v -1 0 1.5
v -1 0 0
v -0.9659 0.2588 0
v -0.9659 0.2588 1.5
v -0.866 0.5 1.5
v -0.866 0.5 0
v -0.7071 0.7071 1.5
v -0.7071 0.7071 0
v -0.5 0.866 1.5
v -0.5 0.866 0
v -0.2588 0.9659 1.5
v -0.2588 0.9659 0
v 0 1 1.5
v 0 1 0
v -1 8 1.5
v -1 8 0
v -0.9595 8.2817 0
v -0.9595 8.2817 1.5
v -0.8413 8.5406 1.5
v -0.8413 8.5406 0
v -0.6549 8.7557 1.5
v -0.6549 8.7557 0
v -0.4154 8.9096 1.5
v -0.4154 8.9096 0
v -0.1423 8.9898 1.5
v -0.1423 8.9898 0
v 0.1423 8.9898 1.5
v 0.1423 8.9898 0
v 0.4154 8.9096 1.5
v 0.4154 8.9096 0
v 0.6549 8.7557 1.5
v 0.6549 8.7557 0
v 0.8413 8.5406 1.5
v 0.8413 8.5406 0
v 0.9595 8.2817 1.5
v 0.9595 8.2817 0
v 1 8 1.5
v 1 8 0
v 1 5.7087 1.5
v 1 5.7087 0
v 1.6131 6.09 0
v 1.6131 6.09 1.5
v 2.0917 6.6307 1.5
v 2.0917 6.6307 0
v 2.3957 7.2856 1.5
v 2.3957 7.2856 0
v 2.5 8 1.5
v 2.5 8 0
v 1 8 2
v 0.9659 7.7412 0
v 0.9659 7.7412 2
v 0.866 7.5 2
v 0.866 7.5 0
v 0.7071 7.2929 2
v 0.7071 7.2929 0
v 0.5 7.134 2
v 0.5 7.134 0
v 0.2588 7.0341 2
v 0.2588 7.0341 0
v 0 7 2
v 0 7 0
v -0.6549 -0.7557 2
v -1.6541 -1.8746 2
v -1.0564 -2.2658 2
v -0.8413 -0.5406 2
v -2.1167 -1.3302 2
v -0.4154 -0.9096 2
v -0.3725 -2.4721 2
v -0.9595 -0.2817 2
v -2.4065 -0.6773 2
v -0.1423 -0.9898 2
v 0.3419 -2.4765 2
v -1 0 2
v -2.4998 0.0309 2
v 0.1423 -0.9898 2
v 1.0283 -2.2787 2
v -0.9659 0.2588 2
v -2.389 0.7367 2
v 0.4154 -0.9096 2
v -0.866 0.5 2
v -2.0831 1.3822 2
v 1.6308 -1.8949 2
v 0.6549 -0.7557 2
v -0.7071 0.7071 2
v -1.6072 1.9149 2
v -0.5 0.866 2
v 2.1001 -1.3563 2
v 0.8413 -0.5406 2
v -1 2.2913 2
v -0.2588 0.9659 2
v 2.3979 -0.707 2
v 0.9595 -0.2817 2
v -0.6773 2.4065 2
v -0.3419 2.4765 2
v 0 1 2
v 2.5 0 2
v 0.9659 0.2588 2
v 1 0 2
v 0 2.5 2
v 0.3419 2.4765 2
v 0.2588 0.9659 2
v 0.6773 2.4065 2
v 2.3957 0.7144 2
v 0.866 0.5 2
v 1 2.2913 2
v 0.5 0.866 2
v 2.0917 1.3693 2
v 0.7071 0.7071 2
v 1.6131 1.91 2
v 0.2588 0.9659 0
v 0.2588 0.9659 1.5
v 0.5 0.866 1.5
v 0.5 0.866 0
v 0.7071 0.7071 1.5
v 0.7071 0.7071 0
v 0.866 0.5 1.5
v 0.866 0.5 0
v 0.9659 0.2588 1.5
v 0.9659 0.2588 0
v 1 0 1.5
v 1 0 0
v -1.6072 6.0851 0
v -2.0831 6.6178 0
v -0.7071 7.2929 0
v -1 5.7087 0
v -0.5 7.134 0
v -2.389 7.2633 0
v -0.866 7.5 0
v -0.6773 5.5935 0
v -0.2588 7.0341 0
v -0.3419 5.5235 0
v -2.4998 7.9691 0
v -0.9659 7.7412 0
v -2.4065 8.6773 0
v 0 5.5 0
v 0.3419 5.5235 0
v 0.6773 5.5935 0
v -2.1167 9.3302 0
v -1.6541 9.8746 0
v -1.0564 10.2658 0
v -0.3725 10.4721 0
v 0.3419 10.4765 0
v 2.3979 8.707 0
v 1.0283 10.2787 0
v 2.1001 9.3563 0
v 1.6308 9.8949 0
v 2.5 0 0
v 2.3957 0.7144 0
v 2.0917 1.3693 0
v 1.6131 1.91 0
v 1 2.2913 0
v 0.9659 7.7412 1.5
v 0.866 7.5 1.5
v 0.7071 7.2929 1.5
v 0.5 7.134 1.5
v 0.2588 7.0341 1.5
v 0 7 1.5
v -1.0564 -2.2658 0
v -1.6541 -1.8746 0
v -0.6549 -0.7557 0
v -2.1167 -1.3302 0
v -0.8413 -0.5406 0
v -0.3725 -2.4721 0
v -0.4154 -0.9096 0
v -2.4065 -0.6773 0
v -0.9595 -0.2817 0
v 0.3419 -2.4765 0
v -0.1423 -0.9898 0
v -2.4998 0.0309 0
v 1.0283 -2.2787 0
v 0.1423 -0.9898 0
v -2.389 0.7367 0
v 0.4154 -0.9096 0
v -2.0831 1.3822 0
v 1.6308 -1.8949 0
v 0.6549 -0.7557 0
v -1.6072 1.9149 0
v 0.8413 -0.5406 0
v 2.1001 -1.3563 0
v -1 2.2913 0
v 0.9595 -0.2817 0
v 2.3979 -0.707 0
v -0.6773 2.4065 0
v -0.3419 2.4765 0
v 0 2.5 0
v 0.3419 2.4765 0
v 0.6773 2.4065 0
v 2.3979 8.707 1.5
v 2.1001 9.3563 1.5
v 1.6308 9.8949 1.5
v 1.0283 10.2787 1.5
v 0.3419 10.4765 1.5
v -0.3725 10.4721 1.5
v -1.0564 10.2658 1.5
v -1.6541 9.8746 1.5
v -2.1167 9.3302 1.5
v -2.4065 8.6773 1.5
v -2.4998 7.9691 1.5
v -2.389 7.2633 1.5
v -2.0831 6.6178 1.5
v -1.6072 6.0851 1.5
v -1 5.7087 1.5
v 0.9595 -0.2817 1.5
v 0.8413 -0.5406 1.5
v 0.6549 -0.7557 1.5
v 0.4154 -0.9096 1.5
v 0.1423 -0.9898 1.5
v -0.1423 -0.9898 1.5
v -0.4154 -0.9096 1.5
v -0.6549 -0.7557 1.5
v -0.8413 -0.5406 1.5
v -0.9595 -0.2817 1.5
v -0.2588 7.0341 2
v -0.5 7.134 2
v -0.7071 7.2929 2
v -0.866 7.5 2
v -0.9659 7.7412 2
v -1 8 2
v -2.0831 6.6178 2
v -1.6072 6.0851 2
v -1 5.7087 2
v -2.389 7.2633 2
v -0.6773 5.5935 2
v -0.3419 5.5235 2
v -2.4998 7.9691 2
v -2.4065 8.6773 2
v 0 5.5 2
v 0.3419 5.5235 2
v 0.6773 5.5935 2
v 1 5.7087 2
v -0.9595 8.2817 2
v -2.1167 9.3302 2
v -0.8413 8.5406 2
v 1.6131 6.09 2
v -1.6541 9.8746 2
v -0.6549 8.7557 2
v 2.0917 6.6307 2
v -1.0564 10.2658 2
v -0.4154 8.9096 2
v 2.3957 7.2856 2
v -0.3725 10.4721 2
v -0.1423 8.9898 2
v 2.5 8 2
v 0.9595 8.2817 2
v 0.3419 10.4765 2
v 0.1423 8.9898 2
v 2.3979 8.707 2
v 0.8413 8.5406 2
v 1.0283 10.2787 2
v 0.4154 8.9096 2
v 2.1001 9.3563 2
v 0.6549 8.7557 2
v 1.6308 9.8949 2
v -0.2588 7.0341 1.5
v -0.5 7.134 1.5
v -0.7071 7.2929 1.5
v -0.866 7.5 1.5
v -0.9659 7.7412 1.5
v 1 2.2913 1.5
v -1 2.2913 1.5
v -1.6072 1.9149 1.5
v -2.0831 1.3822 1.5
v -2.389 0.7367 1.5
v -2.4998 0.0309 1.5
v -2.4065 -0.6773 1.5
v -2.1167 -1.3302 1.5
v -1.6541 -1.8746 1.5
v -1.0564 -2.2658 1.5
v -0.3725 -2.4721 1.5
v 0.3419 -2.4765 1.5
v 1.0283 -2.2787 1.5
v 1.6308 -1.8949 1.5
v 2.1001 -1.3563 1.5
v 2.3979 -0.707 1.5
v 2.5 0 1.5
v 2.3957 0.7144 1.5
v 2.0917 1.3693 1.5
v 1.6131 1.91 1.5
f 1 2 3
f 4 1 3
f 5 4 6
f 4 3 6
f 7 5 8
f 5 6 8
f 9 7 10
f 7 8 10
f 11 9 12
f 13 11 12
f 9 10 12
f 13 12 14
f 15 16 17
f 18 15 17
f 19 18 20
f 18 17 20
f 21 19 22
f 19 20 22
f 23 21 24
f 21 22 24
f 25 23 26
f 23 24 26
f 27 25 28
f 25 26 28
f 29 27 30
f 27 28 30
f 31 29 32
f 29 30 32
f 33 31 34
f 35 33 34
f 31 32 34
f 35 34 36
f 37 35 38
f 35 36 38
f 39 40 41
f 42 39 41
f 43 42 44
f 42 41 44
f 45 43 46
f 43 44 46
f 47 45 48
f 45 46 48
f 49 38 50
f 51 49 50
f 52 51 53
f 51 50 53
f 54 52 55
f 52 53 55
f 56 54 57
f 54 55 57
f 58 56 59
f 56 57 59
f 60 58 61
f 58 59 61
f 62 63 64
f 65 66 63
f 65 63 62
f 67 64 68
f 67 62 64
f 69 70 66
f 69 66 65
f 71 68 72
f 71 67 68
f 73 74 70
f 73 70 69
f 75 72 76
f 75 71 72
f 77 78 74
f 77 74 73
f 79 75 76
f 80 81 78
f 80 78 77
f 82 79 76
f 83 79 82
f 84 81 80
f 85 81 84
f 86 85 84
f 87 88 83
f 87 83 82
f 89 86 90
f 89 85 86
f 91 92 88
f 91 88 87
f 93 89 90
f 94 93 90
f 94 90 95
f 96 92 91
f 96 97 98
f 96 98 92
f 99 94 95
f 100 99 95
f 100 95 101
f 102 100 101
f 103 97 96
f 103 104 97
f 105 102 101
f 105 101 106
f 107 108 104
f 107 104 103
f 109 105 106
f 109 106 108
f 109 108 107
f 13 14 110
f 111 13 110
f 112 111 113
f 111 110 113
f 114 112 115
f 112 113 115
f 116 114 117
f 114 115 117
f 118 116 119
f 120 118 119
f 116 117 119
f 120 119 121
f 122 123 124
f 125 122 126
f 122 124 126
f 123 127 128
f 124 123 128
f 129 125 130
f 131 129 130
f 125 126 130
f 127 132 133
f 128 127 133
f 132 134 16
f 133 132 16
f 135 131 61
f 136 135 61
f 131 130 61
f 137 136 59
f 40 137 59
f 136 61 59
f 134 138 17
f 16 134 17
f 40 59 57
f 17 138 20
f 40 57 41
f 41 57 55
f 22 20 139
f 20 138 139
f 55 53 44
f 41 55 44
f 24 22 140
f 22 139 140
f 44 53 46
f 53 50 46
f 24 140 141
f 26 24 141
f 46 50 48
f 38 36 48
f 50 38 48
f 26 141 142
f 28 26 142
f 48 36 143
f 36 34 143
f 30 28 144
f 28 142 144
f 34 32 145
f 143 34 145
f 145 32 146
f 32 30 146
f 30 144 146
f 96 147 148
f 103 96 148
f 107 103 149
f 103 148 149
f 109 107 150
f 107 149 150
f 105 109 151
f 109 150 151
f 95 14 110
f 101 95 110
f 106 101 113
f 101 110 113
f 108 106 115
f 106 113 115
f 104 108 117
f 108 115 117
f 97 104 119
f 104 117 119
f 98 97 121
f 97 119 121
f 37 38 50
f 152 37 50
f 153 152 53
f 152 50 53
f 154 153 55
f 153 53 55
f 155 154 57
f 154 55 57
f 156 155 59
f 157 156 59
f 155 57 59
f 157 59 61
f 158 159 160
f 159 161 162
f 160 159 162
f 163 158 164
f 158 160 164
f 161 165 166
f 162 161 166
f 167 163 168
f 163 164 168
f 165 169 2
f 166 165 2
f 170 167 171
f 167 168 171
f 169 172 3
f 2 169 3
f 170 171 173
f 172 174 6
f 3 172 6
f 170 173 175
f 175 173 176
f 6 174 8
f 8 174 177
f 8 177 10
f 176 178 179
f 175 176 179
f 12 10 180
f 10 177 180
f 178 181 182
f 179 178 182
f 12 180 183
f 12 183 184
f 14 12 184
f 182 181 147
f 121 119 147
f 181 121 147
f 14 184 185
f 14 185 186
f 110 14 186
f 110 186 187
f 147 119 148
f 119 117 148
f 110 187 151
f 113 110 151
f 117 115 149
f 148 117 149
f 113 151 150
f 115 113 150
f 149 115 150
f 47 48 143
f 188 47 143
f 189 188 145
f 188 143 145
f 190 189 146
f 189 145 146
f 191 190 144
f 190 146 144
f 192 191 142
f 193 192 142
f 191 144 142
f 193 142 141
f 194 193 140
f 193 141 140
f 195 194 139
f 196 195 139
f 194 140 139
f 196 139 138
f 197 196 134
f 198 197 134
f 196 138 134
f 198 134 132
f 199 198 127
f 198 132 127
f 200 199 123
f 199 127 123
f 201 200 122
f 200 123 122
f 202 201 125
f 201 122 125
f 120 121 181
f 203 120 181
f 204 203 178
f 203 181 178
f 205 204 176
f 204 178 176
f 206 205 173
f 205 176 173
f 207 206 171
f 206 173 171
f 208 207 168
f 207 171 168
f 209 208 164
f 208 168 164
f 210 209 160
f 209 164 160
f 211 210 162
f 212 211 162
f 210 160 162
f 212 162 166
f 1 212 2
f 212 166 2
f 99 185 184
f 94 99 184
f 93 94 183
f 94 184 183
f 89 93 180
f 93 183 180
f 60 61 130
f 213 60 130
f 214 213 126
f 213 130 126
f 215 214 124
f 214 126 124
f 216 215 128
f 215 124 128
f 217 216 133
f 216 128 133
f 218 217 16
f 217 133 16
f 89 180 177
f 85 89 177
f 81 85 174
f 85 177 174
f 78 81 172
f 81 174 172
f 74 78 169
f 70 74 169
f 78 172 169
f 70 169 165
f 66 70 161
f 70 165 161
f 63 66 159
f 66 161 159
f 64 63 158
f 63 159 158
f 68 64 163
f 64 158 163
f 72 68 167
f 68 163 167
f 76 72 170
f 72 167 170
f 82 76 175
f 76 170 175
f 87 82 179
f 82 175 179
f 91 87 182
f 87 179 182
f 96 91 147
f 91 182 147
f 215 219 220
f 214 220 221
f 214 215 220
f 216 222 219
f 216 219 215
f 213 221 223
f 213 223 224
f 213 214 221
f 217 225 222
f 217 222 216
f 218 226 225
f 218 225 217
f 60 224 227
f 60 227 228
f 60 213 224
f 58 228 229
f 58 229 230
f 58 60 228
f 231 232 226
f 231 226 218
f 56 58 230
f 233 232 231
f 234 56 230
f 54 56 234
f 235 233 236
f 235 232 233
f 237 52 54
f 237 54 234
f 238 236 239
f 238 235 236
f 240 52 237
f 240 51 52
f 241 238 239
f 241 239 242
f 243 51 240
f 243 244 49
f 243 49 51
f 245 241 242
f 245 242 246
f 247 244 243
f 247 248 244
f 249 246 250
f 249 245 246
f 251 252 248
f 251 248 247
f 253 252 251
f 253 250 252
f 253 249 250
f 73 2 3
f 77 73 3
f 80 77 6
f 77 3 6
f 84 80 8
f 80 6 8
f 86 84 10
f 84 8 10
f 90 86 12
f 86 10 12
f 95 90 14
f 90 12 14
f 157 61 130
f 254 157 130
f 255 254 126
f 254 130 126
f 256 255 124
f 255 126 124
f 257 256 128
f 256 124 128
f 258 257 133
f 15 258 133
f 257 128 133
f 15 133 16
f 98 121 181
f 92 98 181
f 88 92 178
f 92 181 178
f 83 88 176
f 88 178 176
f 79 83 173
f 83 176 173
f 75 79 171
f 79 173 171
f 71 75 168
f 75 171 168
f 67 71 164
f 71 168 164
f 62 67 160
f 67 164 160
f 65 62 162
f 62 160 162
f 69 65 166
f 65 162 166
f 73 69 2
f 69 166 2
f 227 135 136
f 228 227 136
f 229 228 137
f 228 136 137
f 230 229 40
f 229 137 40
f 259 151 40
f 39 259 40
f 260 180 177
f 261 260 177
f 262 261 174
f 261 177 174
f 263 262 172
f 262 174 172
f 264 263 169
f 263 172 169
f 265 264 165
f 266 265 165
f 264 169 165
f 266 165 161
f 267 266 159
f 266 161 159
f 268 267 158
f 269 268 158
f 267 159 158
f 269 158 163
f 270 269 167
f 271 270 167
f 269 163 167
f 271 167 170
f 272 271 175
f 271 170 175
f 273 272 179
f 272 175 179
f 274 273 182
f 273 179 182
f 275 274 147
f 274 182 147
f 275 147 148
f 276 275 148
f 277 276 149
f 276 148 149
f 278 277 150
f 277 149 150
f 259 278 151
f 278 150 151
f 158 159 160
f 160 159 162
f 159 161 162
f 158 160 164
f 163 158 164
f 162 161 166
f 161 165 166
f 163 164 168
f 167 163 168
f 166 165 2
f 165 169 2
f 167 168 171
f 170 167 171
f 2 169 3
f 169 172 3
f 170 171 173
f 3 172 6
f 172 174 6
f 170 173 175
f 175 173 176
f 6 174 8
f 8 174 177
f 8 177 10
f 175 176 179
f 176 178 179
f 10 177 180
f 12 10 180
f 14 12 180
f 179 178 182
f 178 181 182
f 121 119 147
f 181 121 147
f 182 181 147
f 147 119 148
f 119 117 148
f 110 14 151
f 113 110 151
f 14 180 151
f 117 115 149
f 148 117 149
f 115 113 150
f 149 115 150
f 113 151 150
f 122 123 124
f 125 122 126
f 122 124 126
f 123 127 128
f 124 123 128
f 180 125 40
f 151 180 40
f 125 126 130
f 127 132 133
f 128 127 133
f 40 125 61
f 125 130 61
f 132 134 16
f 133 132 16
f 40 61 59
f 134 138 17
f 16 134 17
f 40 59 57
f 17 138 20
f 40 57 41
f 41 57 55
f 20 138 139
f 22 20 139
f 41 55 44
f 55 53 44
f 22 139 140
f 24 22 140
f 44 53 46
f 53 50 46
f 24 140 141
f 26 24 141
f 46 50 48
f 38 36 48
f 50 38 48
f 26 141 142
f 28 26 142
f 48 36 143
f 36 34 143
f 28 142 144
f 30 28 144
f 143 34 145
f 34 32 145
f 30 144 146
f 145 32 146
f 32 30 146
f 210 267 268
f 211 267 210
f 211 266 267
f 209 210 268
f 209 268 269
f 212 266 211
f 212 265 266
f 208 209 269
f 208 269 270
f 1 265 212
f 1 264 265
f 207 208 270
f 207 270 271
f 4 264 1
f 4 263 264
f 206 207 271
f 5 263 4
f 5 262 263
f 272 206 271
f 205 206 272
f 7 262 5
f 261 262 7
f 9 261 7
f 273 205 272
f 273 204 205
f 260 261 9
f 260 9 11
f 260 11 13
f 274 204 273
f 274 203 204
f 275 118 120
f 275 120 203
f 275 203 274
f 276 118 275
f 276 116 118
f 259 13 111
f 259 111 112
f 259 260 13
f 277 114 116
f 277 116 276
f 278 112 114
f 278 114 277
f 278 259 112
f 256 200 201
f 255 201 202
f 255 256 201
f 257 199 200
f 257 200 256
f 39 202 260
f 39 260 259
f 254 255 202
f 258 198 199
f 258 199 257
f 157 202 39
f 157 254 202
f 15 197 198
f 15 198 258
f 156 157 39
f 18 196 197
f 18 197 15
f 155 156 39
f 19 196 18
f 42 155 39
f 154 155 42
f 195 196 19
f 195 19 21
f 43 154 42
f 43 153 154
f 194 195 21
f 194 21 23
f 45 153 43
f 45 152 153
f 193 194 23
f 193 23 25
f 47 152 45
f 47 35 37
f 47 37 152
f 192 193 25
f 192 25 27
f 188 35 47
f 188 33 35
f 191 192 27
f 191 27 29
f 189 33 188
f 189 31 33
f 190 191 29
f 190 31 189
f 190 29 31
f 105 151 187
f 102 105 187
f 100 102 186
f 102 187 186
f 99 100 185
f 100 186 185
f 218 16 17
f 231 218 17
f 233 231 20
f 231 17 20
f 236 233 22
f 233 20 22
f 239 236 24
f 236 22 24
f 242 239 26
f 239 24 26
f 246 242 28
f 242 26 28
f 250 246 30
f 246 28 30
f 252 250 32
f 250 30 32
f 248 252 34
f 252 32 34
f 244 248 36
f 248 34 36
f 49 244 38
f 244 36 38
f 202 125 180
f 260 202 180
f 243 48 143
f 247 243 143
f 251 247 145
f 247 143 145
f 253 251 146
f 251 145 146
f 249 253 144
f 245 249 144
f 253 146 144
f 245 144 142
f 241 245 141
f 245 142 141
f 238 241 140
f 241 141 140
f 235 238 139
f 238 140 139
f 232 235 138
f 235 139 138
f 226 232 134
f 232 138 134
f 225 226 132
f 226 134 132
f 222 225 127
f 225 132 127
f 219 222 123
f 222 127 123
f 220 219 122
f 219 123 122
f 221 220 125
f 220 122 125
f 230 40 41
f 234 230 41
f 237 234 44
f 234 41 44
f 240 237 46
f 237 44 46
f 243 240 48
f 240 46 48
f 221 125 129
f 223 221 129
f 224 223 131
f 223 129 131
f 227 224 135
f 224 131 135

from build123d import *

# Parameters (mm, degrees)
F1_DEPTH = 2
F2_DEPTH = 1.5


with BuildPart() as f1:
    # F0 (on Top) → F1 (new body)
    with BuildSketch(Plane.XY):
        with BuildLine():
            ThreePointArc((2.5, 8), (-1.3693063938, 10.0916500663), (-1, 5.7087121525))
            Line((-1, 5.7087121525), (-1, 8))
            ThreePointArc((-1, 8), (0, 9), (1, 8))
            Line((1, 8), (1, 5.7087121525))
            ThreePointArc((1, 5.7087121525), (2.0916500663, 6.6306936062), (2.5, 8))
        make_face()
        with BuildLine():
            Line((-1, 8), (-1, 5.7087121525))
            ThreePointArc((-1, 5.7087121525), (-0.5107741092, 5.5527342177), (0, 5.5))
            Line((0, 5.5), (0, 7))
            ThreePointArc((0, 7), (-0.7071067812, 7.2928932188), (-1, 8))
        make_face()
        with BuildLine():
            ThreePointArc((0, 5.5), (0.5107741092, 5.5527342177), (1, 5.7087121525))
            Line((1, 5.7087121525), (1, 8))
            ThreePointArc((1, 8), (0.7071067812, 7.2928932188), (0, 7))
            Line((0, 7), (0, 5.5))
        make_face()
    extrude(amount=F1_DEPTH)


with BuildPart() as f1b:
    # F0 (on Top) → F1, piece 2 (new body)
    with BuildSketch(Plane.XY):
        with BuildLine():
            Line((-1, 2.2912878475), (-1, 0))
            ThreePointArc((-1, 0), (-0.7071067812, 0.7071067812), (0, 1))
            Line((0, 1), (0, 2.5))
            ThreePointArc((0, 2.5), (-0.5107741092, 2.4472657823), (-1, 2.2912878475))
        make_face()
        with BuildLine():
            ThreePointArc((1, 0), (0, -1), (-1, 0))
            Line((-1, 0), (-1, 2.2912878475))
            ThreePointArc((-1, 2.2912878475), (-1.3693063938, -2.0916500663), (2.5, 0))
            ThreePointArc((2.5, 0), (2.0916500663, 1.3693063938), (1, 2.2912878475))
            Line((1, 2.2912878475), (1, 0))
        make_face()
        with BuildLine():
            ThreePointArc((0, 1), (0.7071067812, 0.7071067812), (1, 0))
            Line((1, 0), (1, 2.2912878475))
            ThreePointArc((1, 2.2912878475), (0.5107741092, 2.4472657823), (0, 2.5))
            Line((0, 2.5), (0, 1))
        make_face()
    extrude(amount=F1_DEPTH)


with BuildPart() as f2:
    # F0 (on Top) → F2 (new body)
    with BuildSketch(Plane.XY):
        with BuildLine():
            ThreePointArc((0, 2.5), (0.5107741092, 2.4472657823), (1, 2.2912878475))
            Line((1, 2.2912878475), (1, 5.7087121525))
            ThreePointArc((1, 5.7087121525), (0.5107741092, 5.5527342177), (0, 5.5))
            Line((0, 5.5), (0, 2.5))
        make_face()
        with BuildLine():
            Line((-1, 5.7087121525), (-1, 2.2912878475))
            ThreePointArc((-1, 2.2912878475), (-0.5107741092, 2.4472657823), (0, 2.5))
            Line((0, 2.5), (0, 5.5))
            ThreePointArc((0, 5.5), (-0.5107741092, 5.5527342177), (-1, 5.7087121525))
        make_face()
        with BuildLine():
            Line((-1, 2.2912878475), (-1, 0))
            ThreePointArc((-1, 0), (-0.7071067812, 0.7071067812), (0, 1))
            Line((0, 1), (0, 2.5))
            ThreePointArc((0, 2.5), (-0.5107741092, 2.4472657823), (-1, 2.2912878475))
        make_face()
        with BuildLine():
            ThreePointArc((1, 0), (0, -1), (-1, 0))
            Line((-1, 0), (-1, 2.2912878475))
            ThreePointArc((-1, 2.2912878475), (-1.3693063938, -2.0916500663), (2.5, 0))
            ThreePointArc((2.5, 0), (2.0916500663, 1.3693063938), (1, 2.2912878475))
            Line((1, 2.2912878475), (1, 0))
        make_face()
        with BuildLine():
            ThreePointArc((0, 1), (0.7071067812, 0.7071067812), (1, 0))
            Line((1, 0), (1, 2.2912878475))
            ThreePointArc((1, 2.2912878475), (0.5107741092, 2.4472657823), (0, 2.5))
            Line((0, 2.5), (0, 1))
        make_face()
        with BuildLine():
            Line((-1, 8), (-1, 5.7087121525))
            ThreePointArc((-1, 5.7087121525), (-0.5107741092, 5.5527342177), (0, 5.5))
            Line((0, 5.5), (0, 7))
            ThreePointArc((0, 7), (-0.7071067812, 7.2928932188), (-1, 8))
        make_face()
        with BuildLine():
            ThreePointArc((2.5, 8), (-1.3693063938, 10.0916500663), (-1, 5.7087121525))
            Line((-1, 5.7087121525), (-1, 8))
            ThreePointArc((-1, 8), (0, 9), (1, 8))
            Line((1, 8), (1, 5.7087121525))
            ThreePointArc((1, 5.7087121525), (2.0916500663, 6.6306936062), (2.5, 8))
        make_face()
        with BuildLine():
            ThreePointArc((0, 5.5), (0.5107741092, 5.5527342177), (1, 5.7087121525))
            Line((1, 5.7087121525), (1, 8))
            ThreePointArc((1, 8), (0.7071067812, 7.2928932188), (0, 7))
            Line((0, 7), (0, 5.5))
        make_face()
    extrude(amount=F2_DEPTH)


solid = Compound([f1.part, f1b.part, f2.part])
